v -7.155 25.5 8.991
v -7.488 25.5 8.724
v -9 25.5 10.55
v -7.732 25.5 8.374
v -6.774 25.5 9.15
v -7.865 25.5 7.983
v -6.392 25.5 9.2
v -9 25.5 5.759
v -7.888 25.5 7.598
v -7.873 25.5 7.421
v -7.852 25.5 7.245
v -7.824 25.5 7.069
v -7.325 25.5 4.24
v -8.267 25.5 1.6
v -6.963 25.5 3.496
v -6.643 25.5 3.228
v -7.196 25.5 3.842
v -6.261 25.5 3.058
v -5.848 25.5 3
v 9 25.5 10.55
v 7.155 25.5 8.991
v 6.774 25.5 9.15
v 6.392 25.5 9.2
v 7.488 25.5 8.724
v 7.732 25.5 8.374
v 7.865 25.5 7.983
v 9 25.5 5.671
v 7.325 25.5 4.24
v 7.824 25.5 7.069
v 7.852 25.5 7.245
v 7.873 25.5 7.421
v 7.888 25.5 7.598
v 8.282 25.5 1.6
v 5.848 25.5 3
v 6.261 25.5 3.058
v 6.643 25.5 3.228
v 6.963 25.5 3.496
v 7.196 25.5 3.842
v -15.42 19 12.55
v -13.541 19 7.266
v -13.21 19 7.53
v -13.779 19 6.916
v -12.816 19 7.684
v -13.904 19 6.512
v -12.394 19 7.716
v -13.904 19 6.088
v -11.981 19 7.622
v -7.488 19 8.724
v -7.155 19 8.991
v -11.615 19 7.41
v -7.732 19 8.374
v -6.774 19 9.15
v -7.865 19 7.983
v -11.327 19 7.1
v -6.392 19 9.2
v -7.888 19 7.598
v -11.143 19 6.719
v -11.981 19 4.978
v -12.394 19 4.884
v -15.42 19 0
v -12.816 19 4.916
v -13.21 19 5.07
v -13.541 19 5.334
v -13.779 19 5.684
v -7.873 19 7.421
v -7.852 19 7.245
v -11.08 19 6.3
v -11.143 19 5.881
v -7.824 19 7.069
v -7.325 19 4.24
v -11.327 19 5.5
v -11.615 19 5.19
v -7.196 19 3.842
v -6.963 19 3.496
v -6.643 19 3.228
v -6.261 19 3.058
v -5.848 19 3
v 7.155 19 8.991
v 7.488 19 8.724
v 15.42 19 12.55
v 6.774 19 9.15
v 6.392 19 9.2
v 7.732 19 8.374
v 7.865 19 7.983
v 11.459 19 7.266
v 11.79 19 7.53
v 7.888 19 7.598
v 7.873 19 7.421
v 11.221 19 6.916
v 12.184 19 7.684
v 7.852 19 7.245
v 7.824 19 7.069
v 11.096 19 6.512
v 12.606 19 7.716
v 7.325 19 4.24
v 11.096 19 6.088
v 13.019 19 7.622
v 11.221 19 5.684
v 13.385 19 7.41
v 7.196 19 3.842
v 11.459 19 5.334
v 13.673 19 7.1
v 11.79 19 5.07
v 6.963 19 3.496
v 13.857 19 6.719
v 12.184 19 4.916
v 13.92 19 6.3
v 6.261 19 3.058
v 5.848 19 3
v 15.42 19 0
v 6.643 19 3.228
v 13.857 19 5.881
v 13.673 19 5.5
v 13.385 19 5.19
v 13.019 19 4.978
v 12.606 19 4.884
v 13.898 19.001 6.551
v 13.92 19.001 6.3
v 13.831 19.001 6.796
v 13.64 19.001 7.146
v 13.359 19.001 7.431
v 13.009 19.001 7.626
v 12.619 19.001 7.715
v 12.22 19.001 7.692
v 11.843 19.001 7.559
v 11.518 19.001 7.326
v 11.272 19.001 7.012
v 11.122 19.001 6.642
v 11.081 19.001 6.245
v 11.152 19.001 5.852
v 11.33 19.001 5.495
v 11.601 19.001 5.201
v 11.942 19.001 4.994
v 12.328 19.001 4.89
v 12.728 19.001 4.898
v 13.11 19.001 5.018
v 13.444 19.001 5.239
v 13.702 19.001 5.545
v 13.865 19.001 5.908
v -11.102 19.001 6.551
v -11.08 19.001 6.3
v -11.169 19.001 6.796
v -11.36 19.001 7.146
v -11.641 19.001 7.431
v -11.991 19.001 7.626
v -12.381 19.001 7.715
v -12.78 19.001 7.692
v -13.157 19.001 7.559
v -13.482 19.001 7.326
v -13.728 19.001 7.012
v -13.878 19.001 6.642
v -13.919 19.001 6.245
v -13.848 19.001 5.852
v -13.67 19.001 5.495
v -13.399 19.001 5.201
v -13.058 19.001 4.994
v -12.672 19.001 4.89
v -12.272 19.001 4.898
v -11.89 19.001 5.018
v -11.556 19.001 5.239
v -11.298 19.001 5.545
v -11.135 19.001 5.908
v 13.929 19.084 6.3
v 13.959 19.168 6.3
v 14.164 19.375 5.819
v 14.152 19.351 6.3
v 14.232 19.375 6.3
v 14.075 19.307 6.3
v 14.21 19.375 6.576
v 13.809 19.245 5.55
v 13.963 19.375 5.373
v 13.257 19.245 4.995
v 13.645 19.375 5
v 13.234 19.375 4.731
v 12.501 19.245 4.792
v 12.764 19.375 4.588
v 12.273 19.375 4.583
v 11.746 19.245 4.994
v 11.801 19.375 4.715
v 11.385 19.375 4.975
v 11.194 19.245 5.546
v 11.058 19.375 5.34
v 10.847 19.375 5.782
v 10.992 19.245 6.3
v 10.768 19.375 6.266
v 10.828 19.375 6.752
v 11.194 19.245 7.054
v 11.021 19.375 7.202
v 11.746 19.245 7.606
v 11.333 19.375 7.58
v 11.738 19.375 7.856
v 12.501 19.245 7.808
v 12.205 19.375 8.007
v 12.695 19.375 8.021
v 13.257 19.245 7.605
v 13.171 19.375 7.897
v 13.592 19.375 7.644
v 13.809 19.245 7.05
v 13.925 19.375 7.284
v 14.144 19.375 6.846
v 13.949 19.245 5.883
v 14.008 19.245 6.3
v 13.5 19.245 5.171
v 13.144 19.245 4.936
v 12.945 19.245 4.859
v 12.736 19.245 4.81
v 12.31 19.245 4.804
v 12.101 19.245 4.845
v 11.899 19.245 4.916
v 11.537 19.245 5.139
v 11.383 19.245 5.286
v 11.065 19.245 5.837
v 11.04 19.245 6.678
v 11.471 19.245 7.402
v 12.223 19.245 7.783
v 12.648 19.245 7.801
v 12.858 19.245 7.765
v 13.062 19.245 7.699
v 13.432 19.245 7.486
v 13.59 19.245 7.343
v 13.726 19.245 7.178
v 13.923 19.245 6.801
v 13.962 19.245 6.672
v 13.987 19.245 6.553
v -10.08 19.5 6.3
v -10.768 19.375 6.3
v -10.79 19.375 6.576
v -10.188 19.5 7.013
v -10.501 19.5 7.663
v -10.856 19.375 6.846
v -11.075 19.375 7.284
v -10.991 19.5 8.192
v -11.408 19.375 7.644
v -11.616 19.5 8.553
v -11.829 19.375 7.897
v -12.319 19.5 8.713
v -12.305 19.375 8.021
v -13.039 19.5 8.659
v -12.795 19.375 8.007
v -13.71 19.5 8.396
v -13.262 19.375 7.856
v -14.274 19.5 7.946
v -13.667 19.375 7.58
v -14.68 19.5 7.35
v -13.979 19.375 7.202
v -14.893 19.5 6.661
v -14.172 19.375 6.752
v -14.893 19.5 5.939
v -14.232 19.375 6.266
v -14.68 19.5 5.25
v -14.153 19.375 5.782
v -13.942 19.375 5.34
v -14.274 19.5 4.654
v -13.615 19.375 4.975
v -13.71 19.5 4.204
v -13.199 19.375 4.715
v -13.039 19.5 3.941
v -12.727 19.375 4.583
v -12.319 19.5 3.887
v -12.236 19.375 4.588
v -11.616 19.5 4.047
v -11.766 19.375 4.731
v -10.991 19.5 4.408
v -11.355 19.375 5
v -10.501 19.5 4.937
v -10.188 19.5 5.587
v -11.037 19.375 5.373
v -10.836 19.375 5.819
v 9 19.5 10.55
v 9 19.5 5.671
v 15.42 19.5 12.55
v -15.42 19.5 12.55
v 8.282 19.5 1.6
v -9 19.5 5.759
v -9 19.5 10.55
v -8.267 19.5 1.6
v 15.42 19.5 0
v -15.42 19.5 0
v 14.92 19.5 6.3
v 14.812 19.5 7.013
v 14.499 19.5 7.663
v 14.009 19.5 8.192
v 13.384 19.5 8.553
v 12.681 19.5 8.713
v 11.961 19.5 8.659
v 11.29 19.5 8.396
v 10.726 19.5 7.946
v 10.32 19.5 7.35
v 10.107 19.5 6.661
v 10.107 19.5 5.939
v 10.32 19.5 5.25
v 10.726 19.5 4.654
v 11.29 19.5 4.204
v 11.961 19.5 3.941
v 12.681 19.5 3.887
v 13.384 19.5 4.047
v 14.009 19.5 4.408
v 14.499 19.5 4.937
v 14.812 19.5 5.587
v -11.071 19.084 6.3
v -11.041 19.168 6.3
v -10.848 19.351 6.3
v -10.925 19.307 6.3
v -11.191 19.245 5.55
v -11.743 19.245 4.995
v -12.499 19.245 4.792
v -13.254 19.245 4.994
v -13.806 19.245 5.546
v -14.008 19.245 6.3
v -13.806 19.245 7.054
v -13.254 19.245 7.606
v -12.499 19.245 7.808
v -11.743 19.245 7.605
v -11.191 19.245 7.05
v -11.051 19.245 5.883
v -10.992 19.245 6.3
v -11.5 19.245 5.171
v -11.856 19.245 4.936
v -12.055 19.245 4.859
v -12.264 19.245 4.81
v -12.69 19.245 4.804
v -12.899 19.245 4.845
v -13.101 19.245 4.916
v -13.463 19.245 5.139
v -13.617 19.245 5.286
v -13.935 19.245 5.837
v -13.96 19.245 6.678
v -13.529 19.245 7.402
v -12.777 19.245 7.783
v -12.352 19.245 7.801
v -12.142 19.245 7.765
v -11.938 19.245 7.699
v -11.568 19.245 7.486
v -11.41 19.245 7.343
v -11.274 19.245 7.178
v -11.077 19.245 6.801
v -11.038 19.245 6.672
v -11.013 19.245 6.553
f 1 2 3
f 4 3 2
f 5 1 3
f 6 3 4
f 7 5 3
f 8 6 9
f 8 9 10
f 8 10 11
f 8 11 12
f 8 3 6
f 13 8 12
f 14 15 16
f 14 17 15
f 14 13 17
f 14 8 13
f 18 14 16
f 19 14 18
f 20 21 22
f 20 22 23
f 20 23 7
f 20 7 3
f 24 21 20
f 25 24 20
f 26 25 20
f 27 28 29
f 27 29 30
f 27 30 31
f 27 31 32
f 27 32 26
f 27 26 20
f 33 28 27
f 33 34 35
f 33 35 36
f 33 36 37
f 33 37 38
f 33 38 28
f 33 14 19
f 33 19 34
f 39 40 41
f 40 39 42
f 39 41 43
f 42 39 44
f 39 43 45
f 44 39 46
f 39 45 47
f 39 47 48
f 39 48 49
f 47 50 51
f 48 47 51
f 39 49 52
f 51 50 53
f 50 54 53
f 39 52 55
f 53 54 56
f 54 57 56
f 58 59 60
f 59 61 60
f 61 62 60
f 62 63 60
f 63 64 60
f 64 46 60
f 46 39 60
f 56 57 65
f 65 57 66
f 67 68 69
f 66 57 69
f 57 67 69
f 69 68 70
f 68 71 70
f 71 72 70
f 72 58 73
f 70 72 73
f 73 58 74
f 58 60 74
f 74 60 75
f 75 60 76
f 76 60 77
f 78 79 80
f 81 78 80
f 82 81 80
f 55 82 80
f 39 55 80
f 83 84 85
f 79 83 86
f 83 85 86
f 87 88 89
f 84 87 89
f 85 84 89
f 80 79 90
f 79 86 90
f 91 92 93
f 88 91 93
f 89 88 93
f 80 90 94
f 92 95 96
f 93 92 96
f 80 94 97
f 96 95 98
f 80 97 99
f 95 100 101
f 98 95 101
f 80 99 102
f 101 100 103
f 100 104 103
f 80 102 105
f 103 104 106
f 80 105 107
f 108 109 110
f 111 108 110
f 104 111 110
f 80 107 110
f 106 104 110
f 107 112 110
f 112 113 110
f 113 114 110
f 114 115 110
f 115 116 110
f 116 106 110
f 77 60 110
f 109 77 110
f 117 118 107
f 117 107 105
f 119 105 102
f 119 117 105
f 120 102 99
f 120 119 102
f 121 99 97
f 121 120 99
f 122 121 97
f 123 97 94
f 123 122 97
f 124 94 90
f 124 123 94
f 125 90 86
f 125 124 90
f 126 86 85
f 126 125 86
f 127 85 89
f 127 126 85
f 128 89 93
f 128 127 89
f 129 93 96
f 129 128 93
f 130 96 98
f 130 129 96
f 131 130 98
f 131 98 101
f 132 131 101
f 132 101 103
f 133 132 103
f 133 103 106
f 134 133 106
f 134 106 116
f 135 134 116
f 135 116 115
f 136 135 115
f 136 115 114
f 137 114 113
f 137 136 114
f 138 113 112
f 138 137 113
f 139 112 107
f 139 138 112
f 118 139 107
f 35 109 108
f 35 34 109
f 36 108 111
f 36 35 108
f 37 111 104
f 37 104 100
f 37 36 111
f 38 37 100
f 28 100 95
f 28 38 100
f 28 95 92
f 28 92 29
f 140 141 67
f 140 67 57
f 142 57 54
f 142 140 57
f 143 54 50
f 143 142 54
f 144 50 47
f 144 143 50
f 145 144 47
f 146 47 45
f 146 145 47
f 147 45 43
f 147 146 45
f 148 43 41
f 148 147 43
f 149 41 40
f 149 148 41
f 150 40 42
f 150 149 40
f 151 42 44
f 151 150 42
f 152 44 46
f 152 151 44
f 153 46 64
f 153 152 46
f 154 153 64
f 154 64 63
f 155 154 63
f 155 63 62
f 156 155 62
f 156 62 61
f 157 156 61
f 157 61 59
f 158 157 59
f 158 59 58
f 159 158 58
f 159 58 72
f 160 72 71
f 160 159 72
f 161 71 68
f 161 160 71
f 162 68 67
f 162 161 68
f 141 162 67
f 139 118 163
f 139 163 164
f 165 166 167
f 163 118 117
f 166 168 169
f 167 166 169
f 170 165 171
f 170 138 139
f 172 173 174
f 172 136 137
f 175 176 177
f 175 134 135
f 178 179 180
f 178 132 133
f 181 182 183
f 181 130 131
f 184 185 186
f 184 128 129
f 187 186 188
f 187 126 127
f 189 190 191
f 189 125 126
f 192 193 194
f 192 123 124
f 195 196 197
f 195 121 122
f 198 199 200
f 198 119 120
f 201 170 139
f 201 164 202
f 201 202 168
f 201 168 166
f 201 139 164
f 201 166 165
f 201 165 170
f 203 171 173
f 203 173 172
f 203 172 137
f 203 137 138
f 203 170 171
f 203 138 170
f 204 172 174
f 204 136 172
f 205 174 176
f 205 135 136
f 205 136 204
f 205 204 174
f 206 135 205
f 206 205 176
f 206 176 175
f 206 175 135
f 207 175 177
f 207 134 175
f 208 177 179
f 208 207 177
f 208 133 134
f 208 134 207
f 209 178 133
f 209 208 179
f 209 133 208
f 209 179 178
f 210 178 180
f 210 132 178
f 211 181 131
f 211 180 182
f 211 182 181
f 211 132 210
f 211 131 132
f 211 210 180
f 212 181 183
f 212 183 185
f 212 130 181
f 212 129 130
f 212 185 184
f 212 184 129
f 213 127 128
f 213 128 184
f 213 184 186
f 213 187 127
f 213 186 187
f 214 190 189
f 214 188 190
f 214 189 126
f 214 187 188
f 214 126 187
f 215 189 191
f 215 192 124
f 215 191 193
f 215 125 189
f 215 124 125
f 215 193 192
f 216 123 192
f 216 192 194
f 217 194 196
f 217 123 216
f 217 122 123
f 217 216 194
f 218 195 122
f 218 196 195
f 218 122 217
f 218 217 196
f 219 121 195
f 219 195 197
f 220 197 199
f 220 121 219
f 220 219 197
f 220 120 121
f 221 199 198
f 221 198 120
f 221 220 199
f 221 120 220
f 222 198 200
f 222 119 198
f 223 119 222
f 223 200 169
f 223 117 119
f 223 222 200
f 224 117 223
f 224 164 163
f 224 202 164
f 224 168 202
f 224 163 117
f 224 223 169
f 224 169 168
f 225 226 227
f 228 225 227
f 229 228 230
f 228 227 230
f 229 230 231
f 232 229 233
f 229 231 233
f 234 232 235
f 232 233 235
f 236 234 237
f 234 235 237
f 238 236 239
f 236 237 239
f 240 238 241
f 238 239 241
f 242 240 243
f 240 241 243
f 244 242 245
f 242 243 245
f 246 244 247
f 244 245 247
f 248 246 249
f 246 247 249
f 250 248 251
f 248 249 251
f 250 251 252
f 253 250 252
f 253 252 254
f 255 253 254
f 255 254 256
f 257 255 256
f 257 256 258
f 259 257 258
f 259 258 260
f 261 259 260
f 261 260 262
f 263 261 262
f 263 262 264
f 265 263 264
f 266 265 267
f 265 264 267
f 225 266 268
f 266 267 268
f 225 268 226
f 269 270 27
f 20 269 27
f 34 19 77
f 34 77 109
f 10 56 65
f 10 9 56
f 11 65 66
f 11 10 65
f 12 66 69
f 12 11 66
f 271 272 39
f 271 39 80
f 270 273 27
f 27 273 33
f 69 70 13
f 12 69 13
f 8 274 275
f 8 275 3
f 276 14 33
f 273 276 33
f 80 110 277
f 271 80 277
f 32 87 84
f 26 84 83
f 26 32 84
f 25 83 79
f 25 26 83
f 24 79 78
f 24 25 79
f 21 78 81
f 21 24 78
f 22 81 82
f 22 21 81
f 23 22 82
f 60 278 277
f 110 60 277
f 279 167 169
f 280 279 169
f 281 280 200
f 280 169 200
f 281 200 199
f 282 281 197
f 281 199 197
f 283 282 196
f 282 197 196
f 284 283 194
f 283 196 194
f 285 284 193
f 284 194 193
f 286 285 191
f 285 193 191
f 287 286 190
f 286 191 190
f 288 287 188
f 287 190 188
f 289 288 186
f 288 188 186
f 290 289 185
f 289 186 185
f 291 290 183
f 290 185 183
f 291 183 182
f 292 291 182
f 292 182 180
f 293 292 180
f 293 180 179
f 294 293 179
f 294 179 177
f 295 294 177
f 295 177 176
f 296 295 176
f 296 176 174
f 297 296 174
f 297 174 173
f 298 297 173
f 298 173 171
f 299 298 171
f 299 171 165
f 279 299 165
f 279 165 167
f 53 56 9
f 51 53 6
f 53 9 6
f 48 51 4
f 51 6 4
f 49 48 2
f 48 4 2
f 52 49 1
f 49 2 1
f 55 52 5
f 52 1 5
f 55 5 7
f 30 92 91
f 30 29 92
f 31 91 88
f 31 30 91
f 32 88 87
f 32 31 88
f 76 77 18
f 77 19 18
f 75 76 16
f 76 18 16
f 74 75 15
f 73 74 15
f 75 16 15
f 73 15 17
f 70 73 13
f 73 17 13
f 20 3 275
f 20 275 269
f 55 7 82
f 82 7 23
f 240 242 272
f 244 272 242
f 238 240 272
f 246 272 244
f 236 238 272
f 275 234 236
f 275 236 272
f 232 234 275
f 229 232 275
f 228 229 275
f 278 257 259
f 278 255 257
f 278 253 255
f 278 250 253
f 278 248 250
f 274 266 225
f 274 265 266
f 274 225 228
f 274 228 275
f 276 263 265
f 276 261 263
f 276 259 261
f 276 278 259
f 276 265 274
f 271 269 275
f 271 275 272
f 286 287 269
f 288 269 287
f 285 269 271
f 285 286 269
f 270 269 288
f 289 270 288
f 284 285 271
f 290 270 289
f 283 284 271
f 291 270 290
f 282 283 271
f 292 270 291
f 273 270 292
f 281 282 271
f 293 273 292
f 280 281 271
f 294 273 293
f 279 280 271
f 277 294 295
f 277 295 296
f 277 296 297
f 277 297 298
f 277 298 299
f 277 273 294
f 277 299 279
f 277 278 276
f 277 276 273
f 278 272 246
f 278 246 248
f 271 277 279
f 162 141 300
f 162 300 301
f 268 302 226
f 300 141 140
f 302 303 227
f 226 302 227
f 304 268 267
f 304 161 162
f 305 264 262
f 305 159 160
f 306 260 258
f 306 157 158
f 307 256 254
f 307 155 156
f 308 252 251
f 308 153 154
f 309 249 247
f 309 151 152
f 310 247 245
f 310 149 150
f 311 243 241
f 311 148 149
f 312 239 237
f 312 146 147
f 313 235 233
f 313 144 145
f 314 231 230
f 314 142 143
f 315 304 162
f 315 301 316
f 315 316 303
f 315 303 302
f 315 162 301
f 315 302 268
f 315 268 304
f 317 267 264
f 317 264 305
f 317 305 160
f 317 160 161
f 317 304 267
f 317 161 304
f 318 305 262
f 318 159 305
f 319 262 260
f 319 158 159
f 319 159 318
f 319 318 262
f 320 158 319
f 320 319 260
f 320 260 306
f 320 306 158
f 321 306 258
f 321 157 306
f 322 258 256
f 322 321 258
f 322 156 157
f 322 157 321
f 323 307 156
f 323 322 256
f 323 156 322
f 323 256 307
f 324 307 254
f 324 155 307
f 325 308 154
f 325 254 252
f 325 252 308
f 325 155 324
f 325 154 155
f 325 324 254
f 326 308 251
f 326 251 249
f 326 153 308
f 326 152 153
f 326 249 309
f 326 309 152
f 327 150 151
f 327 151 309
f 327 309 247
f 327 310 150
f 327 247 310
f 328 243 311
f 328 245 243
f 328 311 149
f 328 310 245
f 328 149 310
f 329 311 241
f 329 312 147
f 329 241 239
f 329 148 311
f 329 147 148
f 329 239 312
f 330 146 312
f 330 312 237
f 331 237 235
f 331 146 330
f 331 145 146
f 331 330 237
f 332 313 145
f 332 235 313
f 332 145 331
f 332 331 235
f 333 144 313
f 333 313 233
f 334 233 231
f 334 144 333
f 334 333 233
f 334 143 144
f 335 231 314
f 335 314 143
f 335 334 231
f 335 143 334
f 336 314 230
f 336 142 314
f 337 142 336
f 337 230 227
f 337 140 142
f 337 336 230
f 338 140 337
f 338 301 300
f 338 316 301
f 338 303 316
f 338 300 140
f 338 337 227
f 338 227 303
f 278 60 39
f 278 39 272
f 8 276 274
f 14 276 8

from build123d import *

# Parameters (mm, degrees)
BOX013_W          = 30.84
BOX013_H          = 6.5
BOX013_DEPTH      = 12.55
BOX014_W          = 6.5
BOX014_H          = 6
BOX014_DEPTH      = 12.55
BOX015_W          = 6.5
BOX015_H          = 6
BOX015_DEPTH      = 12.55
BOX016_W          = 15.8
BOX016_H          = 7
BOX016_DEPTH      = 6.2
BOX017_W          = 23
BOX017_H          = 6
BOX017_DEPTH      = 1.6
BOX018_W          = 19
BOX018_H          = 6
BOX018_DEPTH      = 2
CYLINDER004_R     = 1.42
CYLINDER004_DEPTH = 3
CYLINDER005_R     = 1.42
CYLINDER005_DEPTH = 3
CHAMFER_1_ANGLE   = 10
CHAMFER_1_SIZE    = 4.5
CHAMFER_2_ANGLE   = 10
CHAMFER_2_SIZE    = 4.5
FILLET_R          = 5
FILLET001_R       = 1.5
FILLET002_R       = 5
FILLET003_R       = 1.5
FILLET004_R       = 1.5
FILLET005_R       = 1.5
FILLET006_R       = 0.38
FILLET007_R       = 0.38
BOX031_W          = 1
BOX031_H          = 6
BOX031_DEPTH      = 10
BOX032_W          = 1
BOX032_H          = 6
BOX032_DEPTH      = 10


with BuildPart() as part:
    # Box013 → Box013 (join)
    with BuildSketch(Plane(origin=(-15.42, 19, 0), x_dir=(1, 0, 0), z_dir=(0, 0, 1))):
        with Locations((15.42, 3.25)):
            Rectangle(BOX013_W, BOX013_H)
    extrude(amount=BOX013_DEPTH)

    # Box014 → Box014 (cut)
    with BuildSketch(Plane(origin=(9, 19.5, 0), x_dir=(1, 0, 0), z_dir=(0, 0, 1))):
        with Locations((3.25, 3)):
            Rectangle(BOX014_W, BOX014_H)
    extrude(amount=BOX014_DEPTH, mode=Mode.SUBTRACT)

    # Box015 → Box015 (cut)
    with BuildSketch(Plane(origin=(-15.5, 19.5, 0), x_dir=(1, 0, 0), z_dir=(0, 0, 1))):
        with Locations((3.25, 3)):
            Rectangle(BOX015_W, BOX015_H)
    extrude(amount=BOX015_DEPTH, mode=Mode.SUBTRACT)

    # Box016 → Box016 (cut)
    with BuildSketch(Plane(origin=(-7.9, 19, 3), x_dir=(1, 0, 0), z_dir=(0, 0, 1))):
        with Locations((7.9, 3.5)):
            Rectangle(BOX016_W, BOX016_H)
    extrude(amount=BOX016_DEPTH, mode=Mode.SUBTRACT)

    # Box017 → Box017 (cut)
    with BuildSketch(Plane(origin=(-11.5, 19.5, 0), x_dir=(1, 0, 0), z_dir=(0, 0, 1))):
        with Locations((11.5, 3)):
            Rectangle(BOX017_W, BOX017_H)
    extrude(amount=BOX017_DEPTH, mode=Mode.SUBTRACT)

    # Box018 → Box018 (cut)
    with BuildSketch(Plane(origin=(-9.5, 19.5, 10.55), x_dir=(1, 0, 0), z_dir=(0, 0, 1))):
        with Locations((9.5, 3)):
            Rectangle(BOX018_W, BOX018_H)
    extrude(amount=BOX018_DEPTH, mode=Mode.SUBTRACT)

    # Cylinder004 → Cylinder004 (cut)
    with BuildSketch(Plane(origin=(12.5, 21, 6.3), x_dir=(1, 0, 0), z_dir=(0, -1, 0))):
        Circle(CYLINDER004_R)
    extrude(amount=CYLINDER004_DEPTH, mode=Mode.SUBTRACT)

    # Cylinder005 → Cylinder005 (cut)
    with BuildSketch(Plane(origin=(-12.5, 20, 6.3), x_dir=(1, 0, 0), z_dir=(0, -1, 0))):
        Circle(CYLINDER005_R)
    extrude(amount=CYLINDER005_DEPTH, mode=Mode.SUBTRACT)

    # Chamfer 1
    chamfer_1_edges = [part.edges().sort_by_distance(p)[0] for p in [
        (7.9, 22.25, 3),
    ]]
    chamfer_1_side = part.faces().sort_by_distance((7.9, 22.25, 6.1))[0]
    chamfer(chamfer_1_edges, length=CHAMFER_1_SIZE, angle=CHAMFER_1_ANGLE, reference=chamfer_1_side)

    # Chamfer 2
    chamfer_2_edges = [part.edges().sort_by_distance(p)[0] for p in [
        (-7.9, 22.25, 3),
    ]]
    chamfer_2_side = part.faces().sort_by_distance((-7.9, 22.25, 6.1))[0]
    chamfer(chamfer_2_edges, length=CHAMFER_2_SIZE, angle=CHAMFER_2_ANGLE, reference=chamfer_2_side)

    # Fillet
    fillet_edges = [part.edges().sort_by_distance(p)[0] for p in [
        (7.9, 22.25, 7.5),
    ]]
    fillet(fillet_edges, radius=FILLET_R)

    # Fillet001
    fillet001_edges = [part.edges().sort_by_distance(p)[0] for p in [
        (7.9, 22.25, 9.2),
    ]]
    fillet(fillet001_edges, radius=FILLET001_R)

    # Fillet002
    fillet002_edges = [part.edges().sort_by_distance(p)[0] for p in [
        (-7.9, 22.25, 7.5),
    ]]
    fillet(fillet002_edges, radius=FILLET002_R)

    # Fillet003
    fillet003_edges = [part.edges().sort_by_distance(p)[0] for p in [
        (-7.9, 22.25, 9.2),
    ]]
    fillet(fillet003_edges, radius=FILLET003_R)

    # Fillet004
    fillet004_edges = [part.edges().sort_by_distance(p)[0] for p in [
        (7.106529, 22.25, 3),
    ]]
    fillet(fillet004_edges, radius=FILLET004_R)

    # Fillet005
    fillet005_edges = [part.edges().sort_by_distance(p)[0] for p in [
        (-7.106529, 22.25, 3),
    ]]
    fillet(fillet005_edges, radius=FILLET005_R)

    # Cone → Cone (revolve, cut)
    with BuildSketch(Plane(origin=(12.5, 19.5, 6.3), x_dir=(1, 0, 0), z_dir=(0, 0, -1))):
        Polygon((0, 0), (2.42, 0), (1.32, 0.2), (0, 0.2), align=None)
    revolve(axis=Axis((12.5, 19.5, 6.3), (0, -1, 0)), mode=Mode.SUBTRACT)

    # Fillet006
    fillet006_edges = [part.edges().sort_by_distance(p)[0] for p in [
        (11.08, 19.318182, 6.3),
    ]]
    fillet(fillet006_edges, radius=FILLET006_R)

    # Cone001 → Cone001 (revolve, cut)
    with BuildSketch(Plane(origin=(-12.5, 19.5, 6.3), x_dir=(1, 0, 0), z_dir=(0, 0, -1))):
        Polygon((0, 0), (2.42, 0), (1.32, 0.2), (0, 0.2), align=None)
    revolve(axis=Axis((-12.5, 19.5, 6.3), (0, -1, 0)), mode=Mode.SUBTRACT)

    # Fillet007
    fillet007_edges = [part.edges().sort_by_distance(p)[0] for p in [
        (-13.92, 19.318182, 6.3),
    ]]
    fillet(fillet007_edges, radius=FILLET007_R)

    # Box031 → Box031 (cut)
    with BuildSketch(Plane(origin=(8, 19.5, 0), x_dir=(0.984808, 0, -0.173648), z_dir=(0.173648, 0, 0.984808))):
        with Locations((0.5, 3)):
            Rectangle(BOX031_W, BOX031_H)
    extrude(amount=BOX031_DEPTH, mode=Mode.SUBTRACT)

    # Box032 → Box032 (cut)
    with BuildSketch(Plane(origin=(-9, 19.5, 0), x_dir=(0.984808, 0, 0.173648), z_dir=(-0.173648, 0, 0.984808))):
        with Locations((0.5, 3)):
            Rectangle(BOX032_W, BOX032_H)
    extrude(amount=BOX032_DEPTH, mode=Mode.SUBTRACT)


solid = part.part
